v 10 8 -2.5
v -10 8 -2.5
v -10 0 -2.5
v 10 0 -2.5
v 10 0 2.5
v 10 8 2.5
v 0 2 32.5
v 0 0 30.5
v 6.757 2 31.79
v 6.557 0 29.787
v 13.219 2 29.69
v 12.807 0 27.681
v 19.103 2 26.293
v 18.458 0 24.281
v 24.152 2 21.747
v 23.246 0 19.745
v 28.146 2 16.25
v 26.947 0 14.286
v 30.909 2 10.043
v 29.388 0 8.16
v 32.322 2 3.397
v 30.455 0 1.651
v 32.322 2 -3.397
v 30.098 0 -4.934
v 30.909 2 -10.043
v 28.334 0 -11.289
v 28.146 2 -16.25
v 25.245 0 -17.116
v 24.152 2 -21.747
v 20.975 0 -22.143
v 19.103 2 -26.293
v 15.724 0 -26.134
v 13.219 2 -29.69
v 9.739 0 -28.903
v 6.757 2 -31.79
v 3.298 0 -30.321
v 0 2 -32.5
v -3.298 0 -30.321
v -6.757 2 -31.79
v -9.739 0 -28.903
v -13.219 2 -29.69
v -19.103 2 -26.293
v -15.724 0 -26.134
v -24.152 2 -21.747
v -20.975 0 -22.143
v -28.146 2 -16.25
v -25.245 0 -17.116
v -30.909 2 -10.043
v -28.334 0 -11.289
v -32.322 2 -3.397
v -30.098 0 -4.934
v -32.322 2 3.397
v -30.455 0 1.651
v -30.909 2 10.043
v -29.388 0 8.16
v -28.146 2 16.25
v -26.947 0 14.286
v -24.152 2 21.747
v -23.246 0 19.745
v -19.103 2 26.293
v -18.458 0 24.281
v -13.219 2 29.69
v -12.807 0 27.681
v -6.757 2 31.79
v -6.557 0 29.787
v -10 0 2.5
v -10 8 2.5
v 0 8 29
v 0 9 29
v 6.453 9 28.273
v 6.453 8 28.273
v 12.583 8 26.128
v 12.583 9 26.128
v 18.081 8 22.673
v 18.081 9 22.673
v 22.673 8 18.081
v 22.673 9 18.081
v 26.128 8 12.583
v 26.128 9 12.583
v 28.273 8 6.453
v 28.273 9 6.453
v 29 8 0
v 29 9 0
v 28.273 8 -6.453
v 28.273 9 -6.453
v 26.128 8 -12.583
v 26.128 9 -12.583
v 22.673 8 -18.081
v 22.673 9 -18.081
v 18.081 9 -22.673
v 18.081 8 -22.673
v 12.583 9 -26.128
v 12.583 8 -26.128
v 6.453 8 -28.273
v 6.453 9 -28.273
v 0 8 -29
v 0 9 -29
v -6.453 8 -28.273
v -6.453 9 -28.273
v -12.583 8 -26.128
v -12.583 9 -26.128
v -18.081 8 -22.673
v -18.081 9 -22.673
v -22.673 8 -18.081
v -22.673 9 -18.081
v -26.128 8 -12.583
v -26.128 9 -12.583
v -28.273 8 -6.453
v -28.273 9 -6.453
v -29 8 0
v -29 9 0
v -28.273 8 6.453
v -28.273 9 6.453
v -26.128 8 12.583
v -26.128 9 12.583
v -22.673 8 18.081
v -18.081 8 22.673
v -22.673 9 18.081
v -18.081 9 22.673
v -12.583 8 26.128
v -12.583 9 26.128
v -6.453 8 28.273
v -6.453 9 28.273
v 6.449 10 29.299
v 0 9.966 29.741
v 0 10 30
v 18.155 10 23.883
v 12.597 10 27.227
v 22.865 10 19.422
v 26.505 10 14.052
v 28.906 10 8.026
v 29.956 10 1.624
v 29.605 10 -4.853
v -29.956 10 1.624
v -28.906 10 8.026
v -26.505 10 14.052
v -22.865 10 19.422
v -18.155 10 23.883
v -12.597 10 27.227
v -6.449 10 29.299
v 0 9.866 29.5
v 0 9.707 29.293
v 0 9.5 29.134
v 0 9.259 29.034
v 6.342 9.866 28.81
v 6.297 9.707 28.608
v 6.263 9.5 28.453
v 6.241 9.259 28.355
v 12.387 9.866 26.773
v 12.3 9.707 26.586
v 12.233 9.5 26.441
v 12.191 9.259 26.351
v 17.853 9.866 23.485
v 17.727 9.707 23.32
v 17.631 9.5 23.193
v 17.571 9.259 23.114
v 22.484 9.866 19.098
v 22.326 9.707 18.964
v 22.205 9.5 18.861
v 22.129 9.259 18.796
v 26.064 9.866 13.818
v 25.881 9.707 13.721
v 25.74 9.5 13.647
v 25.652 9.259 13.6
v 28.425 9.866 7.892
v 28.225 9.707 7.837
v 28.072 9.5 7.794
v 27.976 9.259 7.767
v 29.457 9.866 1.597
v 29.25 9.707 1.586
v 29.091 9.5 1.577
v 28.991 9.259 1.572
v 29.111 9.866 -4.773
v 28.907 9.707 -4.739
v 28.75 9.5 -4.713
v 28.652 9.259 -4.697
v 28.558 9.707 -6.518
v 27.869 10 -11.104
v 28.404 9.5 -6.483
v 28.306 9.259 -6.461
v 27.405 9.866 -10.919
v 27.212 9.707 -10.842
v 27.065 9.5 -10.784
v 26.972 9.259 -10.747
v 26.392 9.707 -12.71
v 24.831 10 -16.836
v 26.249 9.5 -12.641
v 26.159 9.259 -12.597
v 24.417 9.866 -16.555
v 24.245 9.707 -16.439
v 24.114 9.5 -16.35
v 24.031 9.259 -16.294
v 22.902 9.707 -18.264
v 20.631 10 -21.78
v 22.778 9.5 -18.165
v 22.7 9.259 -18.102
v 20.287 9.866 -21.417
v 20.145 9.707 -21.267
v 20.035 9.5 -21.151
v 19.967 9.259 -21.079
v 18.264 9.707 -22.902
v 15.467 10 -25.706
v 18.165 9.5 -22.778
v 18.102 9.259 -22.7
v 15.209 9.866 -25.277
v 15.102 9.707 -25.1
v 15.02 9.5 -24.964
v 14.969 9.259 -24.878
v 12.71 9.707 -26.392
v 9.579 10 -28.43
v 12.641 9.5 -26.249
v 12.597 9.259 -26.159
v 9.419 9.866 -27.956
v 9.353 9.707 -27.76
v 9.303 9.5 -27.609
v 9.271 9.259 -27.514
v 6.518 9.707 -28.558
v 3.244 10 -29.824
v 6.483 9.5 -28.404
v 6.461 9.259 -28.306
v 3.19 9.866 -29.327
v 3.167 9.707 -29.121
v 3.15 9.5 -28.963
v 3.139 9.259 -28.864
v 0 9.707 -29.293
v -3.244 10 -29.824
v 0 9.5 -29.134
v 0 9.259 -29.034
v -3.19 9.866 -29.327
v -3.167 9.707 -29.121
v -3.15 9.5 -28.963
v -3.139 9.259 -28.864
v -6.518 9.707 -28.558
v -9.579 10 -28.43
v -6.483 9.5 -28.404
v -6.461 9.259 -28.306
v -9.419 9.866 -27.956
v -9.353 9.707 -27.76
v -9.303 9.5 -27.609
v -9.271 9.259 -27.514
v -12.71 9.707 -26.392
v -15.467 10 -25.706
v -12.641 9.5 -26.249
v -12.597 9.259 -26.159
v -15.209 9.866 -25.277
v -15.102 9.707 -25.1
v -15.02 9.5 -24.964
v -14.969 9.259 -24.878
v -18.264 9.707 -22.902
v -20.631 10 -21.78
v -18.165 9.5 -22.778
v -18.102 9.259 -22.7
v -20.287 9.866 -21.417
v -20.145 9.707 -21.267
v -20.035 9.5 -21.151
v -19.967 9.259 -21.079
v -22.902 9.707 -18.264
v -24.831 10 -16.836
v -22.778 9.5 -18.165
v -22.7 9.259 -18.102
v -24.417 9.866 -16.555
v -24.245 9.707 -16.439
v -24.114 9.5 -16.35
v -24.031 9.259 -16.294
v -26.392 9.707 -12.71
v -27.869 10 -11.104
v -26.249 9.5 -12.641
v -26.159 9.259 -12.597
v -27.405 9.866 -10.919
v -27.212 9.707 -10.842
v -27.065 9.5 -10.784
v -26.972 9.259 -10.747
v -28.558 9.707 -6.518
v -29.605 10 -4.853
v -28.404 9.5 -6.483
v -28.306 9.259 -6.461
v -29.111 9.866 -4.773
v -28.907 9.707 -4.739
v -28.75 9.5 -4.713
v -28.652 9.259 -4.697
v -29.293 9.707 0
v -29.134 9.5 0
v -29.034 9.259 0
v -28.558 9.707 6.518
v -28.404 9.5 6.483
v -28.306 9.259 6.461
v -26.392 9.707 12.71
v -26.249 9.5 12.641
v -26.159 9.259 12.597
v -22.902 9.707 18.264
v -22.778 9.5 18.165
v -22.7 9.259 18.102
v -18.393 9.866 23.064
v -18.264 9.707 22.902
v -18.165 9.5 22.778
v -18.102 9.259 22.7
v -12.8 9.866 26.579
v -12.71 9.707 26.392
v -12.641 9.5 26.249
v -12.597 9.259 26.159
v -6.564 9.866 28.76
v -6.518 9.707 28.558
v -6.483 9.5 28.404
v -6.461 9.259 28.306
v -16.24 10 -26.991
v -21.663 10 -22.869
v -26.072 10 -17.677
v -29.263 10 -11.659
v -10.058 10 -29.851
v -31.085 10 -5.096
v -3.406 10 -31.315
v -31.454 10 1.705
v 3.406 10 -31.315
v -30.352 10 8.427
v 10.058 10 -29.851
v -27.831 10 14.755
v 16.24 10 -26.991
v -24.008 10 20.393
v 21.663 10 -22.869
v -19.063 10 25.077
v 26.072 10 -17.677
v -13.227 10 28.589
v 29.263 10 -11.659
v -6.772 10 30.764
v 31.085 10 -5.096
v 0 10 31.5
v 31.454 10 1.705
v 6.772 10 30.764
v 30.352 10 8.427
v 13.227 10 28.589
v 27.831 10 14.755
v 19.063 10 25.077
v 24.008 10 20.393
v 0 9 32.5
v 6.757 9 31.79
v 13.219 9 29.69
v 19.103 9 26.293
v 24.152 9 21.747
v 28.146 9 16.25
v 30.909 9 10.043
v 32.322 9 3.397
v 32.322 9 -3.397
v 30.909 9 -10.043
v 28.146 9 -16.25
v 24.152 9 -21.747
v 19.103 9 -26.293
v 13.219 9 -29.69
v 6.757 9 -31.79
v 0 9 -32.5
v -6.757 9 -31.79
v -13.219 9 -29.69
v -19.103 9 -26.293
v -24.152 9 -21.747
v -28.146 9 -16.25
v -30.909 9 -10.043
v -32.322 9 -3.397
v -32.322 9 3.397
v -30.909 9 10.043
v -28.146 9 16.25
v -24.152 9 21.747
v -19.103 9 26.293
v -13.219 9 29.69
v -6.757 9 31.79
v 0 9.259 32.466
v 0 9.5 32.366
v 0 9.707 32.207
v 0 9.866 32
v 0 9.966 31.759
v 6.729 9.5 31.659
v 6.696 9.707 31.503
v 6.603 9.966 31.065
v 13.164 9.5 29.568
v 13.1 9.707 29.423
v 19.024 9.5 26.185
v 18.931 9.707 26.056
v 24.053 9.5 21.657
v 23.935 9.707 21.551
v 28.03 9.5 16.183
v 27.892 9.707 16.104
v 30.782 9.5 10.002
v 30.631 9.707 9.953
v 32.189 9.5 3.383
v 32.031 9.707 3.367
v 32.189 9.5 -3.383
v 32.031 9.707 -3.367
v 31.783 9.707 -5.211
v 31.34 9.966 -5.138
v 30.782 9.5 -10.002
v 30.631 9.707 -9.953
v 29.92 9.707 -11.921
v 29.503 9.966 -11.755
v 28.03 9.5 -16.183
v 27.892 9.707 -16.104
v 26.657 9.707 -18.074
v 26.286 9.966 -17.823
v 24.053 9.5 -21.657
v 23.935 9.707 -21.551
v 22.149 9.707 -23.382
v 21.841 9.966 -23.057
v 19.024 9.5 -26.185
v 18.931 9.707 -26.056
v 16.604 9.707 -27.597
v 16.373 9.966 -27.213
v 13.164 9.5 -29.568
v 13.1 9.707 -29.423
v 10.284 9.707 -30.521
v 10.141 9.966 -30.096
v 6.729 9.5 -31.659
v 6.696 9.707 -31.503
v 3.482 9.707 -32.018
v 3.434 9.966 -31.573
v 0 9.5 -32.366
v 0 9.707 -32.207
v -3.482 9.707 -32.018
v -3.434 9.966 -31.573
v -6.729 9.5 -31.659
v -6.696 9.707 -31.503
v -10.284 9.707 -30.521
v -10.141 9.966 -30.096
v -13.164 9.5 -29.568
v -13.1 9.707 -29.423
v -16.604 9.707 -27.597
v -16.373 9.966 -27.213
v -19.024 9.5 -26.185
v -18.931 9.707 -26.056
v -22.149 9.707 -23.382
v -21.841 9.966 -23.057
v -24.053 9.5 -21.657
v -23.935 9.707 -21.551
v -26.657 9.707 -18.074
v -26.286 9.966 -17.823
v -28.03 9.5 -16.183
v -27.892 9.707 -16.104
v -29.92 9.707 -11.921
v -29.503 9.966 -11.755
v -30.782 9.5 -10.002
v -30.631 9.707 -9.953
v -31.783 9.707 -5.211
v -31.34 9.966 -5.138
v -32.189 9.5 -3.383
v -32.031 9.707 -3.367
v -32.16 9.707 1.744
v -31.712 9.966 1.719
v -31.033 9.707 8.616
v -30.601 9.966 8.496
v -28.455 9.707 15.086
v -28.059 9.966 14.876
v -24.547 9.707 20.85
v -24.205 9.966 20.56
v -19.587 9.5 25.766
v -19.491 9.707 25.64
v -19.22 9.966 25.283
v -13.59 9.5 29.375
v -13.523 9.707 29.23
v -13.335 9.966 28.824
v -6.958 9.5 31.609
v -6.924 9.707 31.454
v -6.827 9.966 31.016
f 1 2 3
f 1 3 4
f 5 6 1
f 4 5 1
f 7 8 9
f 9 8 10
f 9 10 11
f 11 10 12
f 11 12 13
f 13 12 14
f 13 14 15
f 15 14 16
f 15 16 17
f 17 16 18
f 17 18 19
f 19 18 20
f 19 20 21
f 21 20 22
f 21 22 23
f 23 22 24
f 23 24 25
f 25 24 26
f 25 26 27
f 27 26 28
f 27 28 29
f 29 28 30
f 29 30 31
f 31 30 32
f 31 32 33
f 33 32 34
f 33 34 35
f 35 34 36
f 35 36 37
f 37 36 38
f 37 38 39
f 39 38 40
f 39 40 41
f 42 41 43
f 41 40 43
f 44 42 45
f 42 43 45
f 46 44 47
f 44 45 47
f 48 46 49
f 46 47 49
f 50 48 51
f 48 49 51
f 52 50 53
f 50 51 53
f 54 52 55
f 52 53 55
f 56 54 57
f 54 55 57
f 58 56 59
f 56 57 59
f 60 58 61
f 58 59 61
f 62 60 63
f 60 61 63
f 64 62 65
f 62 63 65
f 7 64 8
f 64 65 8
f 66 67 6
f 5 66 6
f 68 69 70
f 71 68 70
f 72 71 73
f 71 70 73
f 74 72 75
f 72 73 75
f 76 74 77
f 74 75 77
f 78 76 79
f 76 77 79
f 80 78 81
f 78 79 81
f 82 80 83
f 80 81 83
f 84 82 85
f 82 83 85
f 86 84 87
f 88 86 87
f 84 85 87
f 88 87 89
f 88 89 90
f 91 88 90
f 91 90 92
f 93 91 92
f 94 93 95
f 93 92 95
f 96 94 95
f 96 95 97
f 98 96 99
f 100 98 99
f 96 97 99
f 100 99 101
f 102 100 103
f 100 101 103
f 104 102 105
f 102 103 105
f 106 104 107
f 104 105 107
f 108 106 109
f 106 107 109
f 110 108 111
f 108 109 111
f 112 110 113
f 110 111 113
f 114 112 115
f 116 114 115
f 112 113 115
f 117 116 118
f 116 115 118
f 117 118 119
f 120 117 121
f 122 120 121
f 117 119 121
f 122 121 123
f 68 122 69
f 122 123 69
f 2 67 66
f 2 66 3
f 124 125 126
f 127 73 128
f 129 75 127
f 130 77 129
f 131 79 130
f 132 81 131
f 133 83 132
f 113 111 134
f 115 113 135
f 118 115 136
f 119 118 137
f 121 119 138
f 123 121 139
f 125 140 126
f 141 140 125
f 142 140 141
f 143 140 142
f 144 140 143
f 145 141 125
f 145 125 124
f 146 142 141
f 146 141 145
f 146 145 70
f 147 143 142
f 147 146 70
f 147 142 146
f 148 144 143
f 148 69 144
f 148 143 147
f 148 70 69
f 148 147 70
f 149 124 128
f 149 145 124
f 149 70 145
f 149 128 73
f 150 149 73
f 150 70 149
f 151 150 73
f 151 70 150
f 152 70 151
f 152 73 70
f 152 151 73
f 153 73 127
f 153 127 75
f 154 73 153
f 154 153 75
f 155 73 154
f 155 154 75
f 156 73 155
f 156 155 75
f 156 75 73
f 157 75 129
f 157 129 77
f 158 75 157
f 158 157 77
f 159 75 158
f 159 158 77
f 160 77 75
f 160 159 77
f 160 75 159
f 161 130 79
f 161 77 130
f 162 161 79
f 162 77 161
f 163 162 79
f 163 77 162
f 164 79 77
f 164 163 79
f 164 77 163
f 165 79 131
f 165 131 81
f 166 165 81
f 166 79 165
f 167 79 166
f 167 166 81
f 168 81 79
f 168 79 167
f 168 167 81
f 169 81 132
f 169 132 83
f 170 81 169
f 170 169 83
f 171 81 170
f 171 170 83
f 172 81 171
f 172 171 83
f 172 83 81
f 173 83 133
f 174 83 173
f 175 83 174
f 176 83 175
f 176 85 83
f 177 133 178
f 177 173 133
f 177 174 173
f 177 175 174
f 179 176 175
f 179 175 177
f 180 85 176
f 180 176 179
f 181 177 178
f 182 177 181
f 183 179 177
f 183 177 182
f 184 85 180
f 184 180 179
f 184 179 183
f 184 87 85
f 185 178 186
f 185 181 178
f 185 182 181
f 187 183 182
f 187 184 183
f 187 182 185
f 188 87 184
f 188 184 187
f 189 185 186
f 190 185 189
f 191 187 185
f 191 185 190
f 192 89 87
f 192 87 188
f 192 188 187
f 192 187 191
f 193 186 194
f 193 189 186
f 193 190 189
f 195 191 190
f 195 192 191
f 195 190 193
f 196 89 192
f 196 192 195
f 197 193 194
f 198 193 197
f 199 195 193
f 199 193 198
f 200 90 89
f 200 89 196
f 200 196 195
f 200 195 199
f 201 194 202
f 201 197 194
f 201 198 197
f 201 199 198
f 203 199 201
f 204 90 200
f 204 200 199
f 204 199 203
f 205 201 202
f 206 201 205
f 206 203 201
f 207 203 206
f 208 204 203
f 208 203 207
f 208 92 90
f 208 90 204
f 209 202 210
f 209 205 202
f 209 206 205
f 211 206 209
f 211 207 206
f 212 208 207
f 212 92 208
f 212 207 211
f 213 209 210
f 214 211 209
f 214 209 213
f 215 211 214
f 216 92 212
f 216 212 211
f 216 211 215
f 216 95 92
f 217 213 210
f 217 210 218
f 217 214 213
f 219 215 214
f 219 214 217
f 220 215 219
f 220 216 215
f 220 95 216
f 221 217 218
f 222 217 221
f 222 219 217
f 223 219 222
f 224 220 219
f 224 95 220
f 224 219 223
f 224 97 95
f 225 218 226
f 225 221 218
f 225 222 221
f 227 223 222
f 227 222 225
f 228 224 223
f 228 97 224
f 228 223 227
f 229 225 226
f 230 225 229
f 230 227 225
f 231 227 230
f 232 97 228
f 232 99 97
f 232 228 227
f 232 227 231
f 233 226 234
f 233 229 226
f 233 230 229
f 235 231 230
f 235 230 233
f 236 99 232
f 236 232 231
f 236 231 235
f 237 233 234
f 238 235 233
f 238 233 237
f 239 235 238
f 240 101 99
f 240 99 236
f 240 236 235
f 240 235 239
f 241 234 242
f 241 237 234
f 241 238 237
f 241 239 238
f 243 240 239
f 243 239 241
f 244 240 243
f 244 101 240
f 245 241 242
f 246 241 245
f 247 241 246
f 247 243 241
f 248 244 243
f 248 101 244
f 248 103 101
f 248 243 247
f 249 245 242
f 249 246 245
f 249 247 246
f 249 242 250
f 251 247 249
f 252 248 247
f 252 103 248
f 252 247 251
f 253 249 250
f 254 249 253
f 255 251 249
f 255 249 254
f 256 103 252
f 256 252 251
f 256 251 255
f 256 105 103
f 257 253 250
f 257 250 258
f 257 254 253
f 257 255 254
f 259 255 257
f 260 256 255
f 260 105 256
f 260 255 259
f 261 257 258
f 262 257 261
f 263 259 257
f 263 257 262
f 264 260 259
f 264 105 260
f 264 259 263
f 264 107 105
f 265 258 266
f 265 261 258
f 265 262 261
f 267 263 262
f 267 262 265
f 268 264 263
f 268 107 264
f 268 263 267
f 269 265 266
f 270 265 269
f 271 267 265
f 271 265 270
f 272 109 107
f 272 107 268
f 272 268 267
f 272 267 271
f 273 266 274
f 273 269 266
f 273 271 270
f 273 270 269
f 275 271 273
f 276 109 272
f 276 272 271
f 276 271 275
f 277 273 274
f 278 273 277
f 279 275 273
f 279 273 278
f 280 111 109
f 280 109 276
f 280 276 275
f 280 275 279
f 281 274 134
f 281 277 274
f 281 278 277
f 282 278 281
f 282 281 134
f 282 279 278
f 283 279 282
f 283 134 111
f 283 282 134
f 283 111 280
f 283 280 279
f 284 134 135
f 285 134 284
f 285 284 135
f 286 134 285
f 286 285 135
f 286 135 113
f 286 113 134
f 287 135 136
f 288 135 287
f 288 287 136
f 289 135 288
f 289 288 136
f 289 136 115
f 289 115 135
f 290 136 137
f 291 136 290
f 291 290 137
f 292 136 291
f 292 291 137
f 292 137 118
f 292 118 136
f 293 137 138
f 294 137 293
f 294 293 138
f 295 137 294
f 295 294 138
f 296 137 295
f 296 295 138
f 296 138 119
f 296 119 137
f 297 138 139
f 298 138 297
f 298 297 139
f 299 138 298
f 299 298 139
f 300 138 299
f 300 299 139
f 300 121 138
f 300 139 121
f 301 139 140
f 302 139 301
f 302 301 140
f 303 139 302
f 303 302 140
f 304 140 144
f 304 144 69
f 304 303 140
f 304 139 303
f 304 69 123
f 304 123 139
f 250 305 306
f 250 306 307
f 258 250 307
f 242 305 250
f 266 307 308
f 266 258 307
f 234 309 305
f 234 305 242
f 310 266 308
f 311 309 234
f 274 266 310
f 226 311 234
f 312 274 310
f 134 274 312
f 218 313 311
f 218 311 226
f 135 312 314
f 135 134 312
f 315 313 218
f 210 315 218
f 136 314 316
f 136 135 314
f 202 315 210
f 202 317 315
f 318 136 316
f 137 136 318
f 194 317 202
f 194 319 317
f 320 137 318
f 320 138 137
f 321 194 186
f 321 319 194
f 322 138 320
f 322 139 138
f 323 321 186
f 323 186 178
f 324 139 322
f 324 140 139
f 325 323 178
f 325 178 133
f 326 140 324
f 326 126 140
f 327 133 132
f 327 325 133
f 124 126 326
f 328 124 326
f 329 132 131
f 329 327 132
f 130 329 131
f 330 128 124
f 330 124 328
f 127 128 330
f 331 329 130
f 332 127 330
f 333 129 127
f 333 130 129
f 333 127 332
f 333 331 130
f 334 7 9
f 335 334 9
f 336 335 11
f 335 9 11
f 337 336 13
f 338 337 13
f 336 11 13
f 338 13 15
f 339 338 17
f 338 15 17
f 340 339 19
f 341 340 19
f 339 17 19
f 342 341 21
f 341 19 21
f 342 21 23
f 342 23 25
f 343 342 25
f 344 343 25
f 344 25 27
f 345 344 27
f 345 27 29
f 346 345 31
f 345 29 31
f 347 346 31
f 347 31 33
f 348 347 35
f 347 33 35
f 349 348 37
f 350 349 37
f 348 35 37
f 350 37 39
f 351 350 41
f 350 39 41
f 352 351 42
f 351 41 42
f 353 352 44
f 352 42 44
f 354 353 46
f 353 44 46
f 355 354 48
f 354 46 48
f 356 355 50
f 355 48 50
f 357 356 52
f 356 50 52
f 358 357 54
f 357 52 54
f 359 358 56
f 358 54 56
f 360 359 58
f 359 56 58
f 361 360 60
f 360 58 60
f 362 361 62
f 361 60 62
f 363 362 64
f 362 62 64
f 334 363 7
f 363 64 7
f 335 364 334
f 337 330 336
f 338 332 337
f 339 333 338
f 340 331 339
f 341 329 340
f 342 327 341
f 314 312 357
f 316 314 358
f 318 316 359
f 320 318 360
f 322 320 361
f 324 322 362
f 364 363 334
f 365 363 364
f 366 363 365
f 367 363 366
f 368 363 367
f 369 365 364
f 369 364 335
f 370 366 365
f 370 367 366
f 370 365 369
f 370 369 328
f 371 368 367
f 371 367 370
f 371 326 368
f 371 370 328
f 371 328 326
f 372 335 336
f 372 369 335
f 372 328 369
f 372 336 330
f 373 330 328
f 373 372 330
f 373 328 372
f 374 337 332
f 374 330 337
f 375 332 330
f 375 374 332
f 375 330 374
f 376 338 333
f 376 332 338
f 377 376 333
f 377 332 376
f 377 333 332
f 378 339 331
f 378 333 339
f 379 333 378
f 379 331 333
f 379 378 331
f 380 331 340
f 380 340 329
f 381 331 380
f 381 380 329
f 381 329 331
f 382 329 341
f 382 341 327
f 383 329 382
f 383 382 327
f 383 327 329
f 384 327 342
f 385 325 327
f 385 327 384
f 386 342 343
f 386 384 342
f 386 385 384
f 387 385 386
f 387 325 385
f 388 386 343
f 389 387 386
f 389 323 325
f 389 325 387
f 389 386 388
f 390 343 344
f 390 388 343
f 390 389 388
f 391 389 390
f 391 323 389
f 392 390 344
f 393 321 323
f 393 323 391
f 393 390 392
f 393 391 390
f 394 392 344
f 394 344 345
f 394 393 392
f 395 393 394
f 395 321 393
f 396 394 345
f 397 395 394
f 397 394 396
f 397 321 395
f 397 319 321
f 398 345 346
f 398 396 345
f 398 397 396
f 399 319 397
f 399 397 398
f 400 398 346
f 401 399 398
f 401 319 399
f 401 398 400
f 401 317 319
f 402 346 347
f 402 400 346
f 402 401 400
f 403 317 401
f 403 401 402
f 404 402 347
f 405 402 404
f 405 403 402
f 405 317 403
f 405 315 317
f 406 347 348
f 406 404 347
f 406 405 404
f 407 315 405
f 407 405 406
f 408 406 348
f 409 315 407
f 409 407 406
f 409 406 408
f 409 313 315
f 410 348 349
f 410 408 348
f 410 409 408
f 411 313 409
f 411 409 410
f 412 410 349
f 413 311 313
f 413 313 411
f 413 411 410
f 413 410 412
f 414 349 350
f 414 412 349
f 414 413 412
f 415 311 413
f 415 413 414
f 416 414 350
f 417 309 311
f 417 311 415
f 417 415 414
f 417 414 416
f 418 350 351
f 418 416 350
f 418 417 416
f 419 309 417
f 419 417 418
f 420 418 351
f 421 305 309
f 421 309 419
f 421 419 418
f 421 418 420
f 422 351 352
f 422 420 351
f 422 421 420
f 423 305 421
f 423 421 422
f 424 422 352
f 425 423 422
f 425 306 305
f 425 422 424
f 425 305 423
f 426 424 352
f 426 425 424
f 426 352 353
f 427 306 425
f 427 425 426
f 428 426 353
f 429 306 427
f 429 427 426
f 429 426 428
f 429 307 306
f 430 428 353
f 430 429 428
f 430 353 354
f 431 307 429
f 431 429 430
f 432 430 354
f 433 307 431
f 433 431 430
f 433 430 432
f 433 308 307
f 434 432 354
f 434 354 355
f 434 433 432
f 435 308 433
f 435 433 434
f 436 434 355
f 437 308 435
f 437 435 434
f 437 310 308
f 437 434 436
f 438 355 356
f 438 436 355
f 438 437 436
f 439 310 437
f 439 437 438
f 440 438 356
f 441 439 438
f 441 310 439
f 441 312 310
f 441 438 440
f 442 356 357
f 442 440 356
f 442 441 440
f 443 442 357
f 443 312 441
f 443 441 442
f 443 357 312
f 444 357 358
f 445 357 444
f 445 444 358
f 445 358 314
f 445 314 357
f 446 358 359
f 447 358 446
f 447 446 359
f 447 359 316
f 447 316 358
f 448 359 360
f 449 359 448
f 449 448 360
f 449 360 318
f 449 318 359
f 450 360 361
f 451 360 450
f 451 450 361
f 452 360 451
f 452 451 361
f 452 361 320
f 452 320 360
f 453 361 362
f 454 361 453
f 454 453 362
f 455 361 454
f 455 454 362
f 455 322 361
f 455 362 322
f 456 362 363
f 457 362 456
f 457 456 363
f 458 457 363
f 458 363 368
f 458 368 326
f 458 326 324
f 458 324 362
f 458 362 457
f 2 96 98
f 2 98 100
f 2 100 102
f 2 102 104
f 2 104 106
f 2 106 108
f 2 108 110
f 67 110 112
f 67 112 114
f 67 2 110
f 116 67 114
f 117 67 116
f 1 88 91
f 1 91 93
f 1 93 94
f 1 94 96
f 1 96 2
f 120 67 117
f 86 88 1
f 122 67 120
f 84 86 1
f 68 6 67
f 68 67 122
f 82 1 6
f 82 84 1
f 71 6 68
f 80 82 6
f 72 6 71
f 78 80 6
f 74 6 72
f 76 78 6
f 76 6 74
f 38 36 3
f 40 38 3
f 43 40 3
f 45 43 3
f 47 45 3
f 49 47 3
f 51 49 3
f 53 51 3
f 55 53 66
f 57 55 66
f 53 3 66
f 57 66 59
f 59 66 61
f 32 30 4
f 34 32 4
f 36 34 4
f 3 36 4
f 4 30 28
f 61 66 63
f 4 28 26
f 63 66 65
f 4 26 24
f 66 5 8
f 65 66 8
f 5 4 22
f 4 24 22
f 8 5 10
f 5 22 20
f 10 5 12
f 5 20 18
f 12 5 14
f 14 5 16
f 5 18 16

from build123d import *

# Parameters (mm, degrees)
SKETCH1_R           = 32.5
BOSS_EXTRUDE4_DEPTH = 10
CUT_EXTRUDE1_REACH  = 12
SKETCH4_W           = 20
SKETCH4_H           = 5
SKETCH5_R           = 29
CUT_EXTRUDE3_DEPTH  = 2
FILLET1_R           = 1
FILLET2_R           = 1
CHAMFER1_SIZE       = 2


with BuildPart() as part:
    # Sketch1 → Boss-Extrude4 (new body)
    with BuildSketch(Plane(origin=(0, 0, 0), x_dir=(1, 0, 0), z_dir=(0, 1, 0))):
        with Locations(Location((0, 0, 0), (0, 0, 270))):  # turned: the seam where the file's is
            Circle(SKETCH1_R)
    extrude(amount=BOSS_EXTRUDE4_DEPTH)

    # Sketch4 → Cut-Extrude1 (cut, up to next)
    with BuildSketch(Plane(origin=(0, 10, 0), x_dir=(1, 0, 0), z_dir=(0, 1, 0)), mode=Mode.PRIVATE) as cut_extrude1_sk1:
        Rectangle(SKETCH4_W, SKETCH4_H)
    cut_extrude1_tool1 = extrude(cut_extrude1_sk1.sketch, amount=-CUT_EXTRUDE1_REACH, mode=Mode.PRIVATE) & part.part
    add(cut_extrude1_tool1.solids().sort_by_distance((0, 10, 0))[0], mode=Mode.SUBTRACT)

    # Sketch5 → Cut-Extrude3 (cut)
    with BuildSketch(Plane(origin=(0, 10, 0), x_dir=(1, 0, 0), z_dir=(0, 1, 0))):
        with Locations(Location((0, 0, 0), (0, 0, 270))):  # turned: the seam where the file's is
            Circle(SKETCH5_R)
    extrude(amount=-CUT_EXTRUDE3_DEPTH, mode=Mode.SUBTRACT)

    # Fillet1
    fillet1_edges = [part.edges().sort_by_distance(p)[0] for p in [
        (0, 10, -32.5),
    ]]
    fillet(fillet1_edges, radius=FILLET1_R)

    # Fillet2
    fillet2_edges = [part.edges().sort_by_distance(p)[0] for p in [
        (0, 10, -29),
    ]]
    fillet(fillet2_edges, radius=FILLET2_R)

    # Chamfer1
    chamfer1_edges = [part.edges().sort_by_distance(p)[0] for p in [
        (0, 0, -32.5),
    ]]
    chamfer(chamfer1_edges, length=CHAMFER1_SIZE)


solid = part.part
